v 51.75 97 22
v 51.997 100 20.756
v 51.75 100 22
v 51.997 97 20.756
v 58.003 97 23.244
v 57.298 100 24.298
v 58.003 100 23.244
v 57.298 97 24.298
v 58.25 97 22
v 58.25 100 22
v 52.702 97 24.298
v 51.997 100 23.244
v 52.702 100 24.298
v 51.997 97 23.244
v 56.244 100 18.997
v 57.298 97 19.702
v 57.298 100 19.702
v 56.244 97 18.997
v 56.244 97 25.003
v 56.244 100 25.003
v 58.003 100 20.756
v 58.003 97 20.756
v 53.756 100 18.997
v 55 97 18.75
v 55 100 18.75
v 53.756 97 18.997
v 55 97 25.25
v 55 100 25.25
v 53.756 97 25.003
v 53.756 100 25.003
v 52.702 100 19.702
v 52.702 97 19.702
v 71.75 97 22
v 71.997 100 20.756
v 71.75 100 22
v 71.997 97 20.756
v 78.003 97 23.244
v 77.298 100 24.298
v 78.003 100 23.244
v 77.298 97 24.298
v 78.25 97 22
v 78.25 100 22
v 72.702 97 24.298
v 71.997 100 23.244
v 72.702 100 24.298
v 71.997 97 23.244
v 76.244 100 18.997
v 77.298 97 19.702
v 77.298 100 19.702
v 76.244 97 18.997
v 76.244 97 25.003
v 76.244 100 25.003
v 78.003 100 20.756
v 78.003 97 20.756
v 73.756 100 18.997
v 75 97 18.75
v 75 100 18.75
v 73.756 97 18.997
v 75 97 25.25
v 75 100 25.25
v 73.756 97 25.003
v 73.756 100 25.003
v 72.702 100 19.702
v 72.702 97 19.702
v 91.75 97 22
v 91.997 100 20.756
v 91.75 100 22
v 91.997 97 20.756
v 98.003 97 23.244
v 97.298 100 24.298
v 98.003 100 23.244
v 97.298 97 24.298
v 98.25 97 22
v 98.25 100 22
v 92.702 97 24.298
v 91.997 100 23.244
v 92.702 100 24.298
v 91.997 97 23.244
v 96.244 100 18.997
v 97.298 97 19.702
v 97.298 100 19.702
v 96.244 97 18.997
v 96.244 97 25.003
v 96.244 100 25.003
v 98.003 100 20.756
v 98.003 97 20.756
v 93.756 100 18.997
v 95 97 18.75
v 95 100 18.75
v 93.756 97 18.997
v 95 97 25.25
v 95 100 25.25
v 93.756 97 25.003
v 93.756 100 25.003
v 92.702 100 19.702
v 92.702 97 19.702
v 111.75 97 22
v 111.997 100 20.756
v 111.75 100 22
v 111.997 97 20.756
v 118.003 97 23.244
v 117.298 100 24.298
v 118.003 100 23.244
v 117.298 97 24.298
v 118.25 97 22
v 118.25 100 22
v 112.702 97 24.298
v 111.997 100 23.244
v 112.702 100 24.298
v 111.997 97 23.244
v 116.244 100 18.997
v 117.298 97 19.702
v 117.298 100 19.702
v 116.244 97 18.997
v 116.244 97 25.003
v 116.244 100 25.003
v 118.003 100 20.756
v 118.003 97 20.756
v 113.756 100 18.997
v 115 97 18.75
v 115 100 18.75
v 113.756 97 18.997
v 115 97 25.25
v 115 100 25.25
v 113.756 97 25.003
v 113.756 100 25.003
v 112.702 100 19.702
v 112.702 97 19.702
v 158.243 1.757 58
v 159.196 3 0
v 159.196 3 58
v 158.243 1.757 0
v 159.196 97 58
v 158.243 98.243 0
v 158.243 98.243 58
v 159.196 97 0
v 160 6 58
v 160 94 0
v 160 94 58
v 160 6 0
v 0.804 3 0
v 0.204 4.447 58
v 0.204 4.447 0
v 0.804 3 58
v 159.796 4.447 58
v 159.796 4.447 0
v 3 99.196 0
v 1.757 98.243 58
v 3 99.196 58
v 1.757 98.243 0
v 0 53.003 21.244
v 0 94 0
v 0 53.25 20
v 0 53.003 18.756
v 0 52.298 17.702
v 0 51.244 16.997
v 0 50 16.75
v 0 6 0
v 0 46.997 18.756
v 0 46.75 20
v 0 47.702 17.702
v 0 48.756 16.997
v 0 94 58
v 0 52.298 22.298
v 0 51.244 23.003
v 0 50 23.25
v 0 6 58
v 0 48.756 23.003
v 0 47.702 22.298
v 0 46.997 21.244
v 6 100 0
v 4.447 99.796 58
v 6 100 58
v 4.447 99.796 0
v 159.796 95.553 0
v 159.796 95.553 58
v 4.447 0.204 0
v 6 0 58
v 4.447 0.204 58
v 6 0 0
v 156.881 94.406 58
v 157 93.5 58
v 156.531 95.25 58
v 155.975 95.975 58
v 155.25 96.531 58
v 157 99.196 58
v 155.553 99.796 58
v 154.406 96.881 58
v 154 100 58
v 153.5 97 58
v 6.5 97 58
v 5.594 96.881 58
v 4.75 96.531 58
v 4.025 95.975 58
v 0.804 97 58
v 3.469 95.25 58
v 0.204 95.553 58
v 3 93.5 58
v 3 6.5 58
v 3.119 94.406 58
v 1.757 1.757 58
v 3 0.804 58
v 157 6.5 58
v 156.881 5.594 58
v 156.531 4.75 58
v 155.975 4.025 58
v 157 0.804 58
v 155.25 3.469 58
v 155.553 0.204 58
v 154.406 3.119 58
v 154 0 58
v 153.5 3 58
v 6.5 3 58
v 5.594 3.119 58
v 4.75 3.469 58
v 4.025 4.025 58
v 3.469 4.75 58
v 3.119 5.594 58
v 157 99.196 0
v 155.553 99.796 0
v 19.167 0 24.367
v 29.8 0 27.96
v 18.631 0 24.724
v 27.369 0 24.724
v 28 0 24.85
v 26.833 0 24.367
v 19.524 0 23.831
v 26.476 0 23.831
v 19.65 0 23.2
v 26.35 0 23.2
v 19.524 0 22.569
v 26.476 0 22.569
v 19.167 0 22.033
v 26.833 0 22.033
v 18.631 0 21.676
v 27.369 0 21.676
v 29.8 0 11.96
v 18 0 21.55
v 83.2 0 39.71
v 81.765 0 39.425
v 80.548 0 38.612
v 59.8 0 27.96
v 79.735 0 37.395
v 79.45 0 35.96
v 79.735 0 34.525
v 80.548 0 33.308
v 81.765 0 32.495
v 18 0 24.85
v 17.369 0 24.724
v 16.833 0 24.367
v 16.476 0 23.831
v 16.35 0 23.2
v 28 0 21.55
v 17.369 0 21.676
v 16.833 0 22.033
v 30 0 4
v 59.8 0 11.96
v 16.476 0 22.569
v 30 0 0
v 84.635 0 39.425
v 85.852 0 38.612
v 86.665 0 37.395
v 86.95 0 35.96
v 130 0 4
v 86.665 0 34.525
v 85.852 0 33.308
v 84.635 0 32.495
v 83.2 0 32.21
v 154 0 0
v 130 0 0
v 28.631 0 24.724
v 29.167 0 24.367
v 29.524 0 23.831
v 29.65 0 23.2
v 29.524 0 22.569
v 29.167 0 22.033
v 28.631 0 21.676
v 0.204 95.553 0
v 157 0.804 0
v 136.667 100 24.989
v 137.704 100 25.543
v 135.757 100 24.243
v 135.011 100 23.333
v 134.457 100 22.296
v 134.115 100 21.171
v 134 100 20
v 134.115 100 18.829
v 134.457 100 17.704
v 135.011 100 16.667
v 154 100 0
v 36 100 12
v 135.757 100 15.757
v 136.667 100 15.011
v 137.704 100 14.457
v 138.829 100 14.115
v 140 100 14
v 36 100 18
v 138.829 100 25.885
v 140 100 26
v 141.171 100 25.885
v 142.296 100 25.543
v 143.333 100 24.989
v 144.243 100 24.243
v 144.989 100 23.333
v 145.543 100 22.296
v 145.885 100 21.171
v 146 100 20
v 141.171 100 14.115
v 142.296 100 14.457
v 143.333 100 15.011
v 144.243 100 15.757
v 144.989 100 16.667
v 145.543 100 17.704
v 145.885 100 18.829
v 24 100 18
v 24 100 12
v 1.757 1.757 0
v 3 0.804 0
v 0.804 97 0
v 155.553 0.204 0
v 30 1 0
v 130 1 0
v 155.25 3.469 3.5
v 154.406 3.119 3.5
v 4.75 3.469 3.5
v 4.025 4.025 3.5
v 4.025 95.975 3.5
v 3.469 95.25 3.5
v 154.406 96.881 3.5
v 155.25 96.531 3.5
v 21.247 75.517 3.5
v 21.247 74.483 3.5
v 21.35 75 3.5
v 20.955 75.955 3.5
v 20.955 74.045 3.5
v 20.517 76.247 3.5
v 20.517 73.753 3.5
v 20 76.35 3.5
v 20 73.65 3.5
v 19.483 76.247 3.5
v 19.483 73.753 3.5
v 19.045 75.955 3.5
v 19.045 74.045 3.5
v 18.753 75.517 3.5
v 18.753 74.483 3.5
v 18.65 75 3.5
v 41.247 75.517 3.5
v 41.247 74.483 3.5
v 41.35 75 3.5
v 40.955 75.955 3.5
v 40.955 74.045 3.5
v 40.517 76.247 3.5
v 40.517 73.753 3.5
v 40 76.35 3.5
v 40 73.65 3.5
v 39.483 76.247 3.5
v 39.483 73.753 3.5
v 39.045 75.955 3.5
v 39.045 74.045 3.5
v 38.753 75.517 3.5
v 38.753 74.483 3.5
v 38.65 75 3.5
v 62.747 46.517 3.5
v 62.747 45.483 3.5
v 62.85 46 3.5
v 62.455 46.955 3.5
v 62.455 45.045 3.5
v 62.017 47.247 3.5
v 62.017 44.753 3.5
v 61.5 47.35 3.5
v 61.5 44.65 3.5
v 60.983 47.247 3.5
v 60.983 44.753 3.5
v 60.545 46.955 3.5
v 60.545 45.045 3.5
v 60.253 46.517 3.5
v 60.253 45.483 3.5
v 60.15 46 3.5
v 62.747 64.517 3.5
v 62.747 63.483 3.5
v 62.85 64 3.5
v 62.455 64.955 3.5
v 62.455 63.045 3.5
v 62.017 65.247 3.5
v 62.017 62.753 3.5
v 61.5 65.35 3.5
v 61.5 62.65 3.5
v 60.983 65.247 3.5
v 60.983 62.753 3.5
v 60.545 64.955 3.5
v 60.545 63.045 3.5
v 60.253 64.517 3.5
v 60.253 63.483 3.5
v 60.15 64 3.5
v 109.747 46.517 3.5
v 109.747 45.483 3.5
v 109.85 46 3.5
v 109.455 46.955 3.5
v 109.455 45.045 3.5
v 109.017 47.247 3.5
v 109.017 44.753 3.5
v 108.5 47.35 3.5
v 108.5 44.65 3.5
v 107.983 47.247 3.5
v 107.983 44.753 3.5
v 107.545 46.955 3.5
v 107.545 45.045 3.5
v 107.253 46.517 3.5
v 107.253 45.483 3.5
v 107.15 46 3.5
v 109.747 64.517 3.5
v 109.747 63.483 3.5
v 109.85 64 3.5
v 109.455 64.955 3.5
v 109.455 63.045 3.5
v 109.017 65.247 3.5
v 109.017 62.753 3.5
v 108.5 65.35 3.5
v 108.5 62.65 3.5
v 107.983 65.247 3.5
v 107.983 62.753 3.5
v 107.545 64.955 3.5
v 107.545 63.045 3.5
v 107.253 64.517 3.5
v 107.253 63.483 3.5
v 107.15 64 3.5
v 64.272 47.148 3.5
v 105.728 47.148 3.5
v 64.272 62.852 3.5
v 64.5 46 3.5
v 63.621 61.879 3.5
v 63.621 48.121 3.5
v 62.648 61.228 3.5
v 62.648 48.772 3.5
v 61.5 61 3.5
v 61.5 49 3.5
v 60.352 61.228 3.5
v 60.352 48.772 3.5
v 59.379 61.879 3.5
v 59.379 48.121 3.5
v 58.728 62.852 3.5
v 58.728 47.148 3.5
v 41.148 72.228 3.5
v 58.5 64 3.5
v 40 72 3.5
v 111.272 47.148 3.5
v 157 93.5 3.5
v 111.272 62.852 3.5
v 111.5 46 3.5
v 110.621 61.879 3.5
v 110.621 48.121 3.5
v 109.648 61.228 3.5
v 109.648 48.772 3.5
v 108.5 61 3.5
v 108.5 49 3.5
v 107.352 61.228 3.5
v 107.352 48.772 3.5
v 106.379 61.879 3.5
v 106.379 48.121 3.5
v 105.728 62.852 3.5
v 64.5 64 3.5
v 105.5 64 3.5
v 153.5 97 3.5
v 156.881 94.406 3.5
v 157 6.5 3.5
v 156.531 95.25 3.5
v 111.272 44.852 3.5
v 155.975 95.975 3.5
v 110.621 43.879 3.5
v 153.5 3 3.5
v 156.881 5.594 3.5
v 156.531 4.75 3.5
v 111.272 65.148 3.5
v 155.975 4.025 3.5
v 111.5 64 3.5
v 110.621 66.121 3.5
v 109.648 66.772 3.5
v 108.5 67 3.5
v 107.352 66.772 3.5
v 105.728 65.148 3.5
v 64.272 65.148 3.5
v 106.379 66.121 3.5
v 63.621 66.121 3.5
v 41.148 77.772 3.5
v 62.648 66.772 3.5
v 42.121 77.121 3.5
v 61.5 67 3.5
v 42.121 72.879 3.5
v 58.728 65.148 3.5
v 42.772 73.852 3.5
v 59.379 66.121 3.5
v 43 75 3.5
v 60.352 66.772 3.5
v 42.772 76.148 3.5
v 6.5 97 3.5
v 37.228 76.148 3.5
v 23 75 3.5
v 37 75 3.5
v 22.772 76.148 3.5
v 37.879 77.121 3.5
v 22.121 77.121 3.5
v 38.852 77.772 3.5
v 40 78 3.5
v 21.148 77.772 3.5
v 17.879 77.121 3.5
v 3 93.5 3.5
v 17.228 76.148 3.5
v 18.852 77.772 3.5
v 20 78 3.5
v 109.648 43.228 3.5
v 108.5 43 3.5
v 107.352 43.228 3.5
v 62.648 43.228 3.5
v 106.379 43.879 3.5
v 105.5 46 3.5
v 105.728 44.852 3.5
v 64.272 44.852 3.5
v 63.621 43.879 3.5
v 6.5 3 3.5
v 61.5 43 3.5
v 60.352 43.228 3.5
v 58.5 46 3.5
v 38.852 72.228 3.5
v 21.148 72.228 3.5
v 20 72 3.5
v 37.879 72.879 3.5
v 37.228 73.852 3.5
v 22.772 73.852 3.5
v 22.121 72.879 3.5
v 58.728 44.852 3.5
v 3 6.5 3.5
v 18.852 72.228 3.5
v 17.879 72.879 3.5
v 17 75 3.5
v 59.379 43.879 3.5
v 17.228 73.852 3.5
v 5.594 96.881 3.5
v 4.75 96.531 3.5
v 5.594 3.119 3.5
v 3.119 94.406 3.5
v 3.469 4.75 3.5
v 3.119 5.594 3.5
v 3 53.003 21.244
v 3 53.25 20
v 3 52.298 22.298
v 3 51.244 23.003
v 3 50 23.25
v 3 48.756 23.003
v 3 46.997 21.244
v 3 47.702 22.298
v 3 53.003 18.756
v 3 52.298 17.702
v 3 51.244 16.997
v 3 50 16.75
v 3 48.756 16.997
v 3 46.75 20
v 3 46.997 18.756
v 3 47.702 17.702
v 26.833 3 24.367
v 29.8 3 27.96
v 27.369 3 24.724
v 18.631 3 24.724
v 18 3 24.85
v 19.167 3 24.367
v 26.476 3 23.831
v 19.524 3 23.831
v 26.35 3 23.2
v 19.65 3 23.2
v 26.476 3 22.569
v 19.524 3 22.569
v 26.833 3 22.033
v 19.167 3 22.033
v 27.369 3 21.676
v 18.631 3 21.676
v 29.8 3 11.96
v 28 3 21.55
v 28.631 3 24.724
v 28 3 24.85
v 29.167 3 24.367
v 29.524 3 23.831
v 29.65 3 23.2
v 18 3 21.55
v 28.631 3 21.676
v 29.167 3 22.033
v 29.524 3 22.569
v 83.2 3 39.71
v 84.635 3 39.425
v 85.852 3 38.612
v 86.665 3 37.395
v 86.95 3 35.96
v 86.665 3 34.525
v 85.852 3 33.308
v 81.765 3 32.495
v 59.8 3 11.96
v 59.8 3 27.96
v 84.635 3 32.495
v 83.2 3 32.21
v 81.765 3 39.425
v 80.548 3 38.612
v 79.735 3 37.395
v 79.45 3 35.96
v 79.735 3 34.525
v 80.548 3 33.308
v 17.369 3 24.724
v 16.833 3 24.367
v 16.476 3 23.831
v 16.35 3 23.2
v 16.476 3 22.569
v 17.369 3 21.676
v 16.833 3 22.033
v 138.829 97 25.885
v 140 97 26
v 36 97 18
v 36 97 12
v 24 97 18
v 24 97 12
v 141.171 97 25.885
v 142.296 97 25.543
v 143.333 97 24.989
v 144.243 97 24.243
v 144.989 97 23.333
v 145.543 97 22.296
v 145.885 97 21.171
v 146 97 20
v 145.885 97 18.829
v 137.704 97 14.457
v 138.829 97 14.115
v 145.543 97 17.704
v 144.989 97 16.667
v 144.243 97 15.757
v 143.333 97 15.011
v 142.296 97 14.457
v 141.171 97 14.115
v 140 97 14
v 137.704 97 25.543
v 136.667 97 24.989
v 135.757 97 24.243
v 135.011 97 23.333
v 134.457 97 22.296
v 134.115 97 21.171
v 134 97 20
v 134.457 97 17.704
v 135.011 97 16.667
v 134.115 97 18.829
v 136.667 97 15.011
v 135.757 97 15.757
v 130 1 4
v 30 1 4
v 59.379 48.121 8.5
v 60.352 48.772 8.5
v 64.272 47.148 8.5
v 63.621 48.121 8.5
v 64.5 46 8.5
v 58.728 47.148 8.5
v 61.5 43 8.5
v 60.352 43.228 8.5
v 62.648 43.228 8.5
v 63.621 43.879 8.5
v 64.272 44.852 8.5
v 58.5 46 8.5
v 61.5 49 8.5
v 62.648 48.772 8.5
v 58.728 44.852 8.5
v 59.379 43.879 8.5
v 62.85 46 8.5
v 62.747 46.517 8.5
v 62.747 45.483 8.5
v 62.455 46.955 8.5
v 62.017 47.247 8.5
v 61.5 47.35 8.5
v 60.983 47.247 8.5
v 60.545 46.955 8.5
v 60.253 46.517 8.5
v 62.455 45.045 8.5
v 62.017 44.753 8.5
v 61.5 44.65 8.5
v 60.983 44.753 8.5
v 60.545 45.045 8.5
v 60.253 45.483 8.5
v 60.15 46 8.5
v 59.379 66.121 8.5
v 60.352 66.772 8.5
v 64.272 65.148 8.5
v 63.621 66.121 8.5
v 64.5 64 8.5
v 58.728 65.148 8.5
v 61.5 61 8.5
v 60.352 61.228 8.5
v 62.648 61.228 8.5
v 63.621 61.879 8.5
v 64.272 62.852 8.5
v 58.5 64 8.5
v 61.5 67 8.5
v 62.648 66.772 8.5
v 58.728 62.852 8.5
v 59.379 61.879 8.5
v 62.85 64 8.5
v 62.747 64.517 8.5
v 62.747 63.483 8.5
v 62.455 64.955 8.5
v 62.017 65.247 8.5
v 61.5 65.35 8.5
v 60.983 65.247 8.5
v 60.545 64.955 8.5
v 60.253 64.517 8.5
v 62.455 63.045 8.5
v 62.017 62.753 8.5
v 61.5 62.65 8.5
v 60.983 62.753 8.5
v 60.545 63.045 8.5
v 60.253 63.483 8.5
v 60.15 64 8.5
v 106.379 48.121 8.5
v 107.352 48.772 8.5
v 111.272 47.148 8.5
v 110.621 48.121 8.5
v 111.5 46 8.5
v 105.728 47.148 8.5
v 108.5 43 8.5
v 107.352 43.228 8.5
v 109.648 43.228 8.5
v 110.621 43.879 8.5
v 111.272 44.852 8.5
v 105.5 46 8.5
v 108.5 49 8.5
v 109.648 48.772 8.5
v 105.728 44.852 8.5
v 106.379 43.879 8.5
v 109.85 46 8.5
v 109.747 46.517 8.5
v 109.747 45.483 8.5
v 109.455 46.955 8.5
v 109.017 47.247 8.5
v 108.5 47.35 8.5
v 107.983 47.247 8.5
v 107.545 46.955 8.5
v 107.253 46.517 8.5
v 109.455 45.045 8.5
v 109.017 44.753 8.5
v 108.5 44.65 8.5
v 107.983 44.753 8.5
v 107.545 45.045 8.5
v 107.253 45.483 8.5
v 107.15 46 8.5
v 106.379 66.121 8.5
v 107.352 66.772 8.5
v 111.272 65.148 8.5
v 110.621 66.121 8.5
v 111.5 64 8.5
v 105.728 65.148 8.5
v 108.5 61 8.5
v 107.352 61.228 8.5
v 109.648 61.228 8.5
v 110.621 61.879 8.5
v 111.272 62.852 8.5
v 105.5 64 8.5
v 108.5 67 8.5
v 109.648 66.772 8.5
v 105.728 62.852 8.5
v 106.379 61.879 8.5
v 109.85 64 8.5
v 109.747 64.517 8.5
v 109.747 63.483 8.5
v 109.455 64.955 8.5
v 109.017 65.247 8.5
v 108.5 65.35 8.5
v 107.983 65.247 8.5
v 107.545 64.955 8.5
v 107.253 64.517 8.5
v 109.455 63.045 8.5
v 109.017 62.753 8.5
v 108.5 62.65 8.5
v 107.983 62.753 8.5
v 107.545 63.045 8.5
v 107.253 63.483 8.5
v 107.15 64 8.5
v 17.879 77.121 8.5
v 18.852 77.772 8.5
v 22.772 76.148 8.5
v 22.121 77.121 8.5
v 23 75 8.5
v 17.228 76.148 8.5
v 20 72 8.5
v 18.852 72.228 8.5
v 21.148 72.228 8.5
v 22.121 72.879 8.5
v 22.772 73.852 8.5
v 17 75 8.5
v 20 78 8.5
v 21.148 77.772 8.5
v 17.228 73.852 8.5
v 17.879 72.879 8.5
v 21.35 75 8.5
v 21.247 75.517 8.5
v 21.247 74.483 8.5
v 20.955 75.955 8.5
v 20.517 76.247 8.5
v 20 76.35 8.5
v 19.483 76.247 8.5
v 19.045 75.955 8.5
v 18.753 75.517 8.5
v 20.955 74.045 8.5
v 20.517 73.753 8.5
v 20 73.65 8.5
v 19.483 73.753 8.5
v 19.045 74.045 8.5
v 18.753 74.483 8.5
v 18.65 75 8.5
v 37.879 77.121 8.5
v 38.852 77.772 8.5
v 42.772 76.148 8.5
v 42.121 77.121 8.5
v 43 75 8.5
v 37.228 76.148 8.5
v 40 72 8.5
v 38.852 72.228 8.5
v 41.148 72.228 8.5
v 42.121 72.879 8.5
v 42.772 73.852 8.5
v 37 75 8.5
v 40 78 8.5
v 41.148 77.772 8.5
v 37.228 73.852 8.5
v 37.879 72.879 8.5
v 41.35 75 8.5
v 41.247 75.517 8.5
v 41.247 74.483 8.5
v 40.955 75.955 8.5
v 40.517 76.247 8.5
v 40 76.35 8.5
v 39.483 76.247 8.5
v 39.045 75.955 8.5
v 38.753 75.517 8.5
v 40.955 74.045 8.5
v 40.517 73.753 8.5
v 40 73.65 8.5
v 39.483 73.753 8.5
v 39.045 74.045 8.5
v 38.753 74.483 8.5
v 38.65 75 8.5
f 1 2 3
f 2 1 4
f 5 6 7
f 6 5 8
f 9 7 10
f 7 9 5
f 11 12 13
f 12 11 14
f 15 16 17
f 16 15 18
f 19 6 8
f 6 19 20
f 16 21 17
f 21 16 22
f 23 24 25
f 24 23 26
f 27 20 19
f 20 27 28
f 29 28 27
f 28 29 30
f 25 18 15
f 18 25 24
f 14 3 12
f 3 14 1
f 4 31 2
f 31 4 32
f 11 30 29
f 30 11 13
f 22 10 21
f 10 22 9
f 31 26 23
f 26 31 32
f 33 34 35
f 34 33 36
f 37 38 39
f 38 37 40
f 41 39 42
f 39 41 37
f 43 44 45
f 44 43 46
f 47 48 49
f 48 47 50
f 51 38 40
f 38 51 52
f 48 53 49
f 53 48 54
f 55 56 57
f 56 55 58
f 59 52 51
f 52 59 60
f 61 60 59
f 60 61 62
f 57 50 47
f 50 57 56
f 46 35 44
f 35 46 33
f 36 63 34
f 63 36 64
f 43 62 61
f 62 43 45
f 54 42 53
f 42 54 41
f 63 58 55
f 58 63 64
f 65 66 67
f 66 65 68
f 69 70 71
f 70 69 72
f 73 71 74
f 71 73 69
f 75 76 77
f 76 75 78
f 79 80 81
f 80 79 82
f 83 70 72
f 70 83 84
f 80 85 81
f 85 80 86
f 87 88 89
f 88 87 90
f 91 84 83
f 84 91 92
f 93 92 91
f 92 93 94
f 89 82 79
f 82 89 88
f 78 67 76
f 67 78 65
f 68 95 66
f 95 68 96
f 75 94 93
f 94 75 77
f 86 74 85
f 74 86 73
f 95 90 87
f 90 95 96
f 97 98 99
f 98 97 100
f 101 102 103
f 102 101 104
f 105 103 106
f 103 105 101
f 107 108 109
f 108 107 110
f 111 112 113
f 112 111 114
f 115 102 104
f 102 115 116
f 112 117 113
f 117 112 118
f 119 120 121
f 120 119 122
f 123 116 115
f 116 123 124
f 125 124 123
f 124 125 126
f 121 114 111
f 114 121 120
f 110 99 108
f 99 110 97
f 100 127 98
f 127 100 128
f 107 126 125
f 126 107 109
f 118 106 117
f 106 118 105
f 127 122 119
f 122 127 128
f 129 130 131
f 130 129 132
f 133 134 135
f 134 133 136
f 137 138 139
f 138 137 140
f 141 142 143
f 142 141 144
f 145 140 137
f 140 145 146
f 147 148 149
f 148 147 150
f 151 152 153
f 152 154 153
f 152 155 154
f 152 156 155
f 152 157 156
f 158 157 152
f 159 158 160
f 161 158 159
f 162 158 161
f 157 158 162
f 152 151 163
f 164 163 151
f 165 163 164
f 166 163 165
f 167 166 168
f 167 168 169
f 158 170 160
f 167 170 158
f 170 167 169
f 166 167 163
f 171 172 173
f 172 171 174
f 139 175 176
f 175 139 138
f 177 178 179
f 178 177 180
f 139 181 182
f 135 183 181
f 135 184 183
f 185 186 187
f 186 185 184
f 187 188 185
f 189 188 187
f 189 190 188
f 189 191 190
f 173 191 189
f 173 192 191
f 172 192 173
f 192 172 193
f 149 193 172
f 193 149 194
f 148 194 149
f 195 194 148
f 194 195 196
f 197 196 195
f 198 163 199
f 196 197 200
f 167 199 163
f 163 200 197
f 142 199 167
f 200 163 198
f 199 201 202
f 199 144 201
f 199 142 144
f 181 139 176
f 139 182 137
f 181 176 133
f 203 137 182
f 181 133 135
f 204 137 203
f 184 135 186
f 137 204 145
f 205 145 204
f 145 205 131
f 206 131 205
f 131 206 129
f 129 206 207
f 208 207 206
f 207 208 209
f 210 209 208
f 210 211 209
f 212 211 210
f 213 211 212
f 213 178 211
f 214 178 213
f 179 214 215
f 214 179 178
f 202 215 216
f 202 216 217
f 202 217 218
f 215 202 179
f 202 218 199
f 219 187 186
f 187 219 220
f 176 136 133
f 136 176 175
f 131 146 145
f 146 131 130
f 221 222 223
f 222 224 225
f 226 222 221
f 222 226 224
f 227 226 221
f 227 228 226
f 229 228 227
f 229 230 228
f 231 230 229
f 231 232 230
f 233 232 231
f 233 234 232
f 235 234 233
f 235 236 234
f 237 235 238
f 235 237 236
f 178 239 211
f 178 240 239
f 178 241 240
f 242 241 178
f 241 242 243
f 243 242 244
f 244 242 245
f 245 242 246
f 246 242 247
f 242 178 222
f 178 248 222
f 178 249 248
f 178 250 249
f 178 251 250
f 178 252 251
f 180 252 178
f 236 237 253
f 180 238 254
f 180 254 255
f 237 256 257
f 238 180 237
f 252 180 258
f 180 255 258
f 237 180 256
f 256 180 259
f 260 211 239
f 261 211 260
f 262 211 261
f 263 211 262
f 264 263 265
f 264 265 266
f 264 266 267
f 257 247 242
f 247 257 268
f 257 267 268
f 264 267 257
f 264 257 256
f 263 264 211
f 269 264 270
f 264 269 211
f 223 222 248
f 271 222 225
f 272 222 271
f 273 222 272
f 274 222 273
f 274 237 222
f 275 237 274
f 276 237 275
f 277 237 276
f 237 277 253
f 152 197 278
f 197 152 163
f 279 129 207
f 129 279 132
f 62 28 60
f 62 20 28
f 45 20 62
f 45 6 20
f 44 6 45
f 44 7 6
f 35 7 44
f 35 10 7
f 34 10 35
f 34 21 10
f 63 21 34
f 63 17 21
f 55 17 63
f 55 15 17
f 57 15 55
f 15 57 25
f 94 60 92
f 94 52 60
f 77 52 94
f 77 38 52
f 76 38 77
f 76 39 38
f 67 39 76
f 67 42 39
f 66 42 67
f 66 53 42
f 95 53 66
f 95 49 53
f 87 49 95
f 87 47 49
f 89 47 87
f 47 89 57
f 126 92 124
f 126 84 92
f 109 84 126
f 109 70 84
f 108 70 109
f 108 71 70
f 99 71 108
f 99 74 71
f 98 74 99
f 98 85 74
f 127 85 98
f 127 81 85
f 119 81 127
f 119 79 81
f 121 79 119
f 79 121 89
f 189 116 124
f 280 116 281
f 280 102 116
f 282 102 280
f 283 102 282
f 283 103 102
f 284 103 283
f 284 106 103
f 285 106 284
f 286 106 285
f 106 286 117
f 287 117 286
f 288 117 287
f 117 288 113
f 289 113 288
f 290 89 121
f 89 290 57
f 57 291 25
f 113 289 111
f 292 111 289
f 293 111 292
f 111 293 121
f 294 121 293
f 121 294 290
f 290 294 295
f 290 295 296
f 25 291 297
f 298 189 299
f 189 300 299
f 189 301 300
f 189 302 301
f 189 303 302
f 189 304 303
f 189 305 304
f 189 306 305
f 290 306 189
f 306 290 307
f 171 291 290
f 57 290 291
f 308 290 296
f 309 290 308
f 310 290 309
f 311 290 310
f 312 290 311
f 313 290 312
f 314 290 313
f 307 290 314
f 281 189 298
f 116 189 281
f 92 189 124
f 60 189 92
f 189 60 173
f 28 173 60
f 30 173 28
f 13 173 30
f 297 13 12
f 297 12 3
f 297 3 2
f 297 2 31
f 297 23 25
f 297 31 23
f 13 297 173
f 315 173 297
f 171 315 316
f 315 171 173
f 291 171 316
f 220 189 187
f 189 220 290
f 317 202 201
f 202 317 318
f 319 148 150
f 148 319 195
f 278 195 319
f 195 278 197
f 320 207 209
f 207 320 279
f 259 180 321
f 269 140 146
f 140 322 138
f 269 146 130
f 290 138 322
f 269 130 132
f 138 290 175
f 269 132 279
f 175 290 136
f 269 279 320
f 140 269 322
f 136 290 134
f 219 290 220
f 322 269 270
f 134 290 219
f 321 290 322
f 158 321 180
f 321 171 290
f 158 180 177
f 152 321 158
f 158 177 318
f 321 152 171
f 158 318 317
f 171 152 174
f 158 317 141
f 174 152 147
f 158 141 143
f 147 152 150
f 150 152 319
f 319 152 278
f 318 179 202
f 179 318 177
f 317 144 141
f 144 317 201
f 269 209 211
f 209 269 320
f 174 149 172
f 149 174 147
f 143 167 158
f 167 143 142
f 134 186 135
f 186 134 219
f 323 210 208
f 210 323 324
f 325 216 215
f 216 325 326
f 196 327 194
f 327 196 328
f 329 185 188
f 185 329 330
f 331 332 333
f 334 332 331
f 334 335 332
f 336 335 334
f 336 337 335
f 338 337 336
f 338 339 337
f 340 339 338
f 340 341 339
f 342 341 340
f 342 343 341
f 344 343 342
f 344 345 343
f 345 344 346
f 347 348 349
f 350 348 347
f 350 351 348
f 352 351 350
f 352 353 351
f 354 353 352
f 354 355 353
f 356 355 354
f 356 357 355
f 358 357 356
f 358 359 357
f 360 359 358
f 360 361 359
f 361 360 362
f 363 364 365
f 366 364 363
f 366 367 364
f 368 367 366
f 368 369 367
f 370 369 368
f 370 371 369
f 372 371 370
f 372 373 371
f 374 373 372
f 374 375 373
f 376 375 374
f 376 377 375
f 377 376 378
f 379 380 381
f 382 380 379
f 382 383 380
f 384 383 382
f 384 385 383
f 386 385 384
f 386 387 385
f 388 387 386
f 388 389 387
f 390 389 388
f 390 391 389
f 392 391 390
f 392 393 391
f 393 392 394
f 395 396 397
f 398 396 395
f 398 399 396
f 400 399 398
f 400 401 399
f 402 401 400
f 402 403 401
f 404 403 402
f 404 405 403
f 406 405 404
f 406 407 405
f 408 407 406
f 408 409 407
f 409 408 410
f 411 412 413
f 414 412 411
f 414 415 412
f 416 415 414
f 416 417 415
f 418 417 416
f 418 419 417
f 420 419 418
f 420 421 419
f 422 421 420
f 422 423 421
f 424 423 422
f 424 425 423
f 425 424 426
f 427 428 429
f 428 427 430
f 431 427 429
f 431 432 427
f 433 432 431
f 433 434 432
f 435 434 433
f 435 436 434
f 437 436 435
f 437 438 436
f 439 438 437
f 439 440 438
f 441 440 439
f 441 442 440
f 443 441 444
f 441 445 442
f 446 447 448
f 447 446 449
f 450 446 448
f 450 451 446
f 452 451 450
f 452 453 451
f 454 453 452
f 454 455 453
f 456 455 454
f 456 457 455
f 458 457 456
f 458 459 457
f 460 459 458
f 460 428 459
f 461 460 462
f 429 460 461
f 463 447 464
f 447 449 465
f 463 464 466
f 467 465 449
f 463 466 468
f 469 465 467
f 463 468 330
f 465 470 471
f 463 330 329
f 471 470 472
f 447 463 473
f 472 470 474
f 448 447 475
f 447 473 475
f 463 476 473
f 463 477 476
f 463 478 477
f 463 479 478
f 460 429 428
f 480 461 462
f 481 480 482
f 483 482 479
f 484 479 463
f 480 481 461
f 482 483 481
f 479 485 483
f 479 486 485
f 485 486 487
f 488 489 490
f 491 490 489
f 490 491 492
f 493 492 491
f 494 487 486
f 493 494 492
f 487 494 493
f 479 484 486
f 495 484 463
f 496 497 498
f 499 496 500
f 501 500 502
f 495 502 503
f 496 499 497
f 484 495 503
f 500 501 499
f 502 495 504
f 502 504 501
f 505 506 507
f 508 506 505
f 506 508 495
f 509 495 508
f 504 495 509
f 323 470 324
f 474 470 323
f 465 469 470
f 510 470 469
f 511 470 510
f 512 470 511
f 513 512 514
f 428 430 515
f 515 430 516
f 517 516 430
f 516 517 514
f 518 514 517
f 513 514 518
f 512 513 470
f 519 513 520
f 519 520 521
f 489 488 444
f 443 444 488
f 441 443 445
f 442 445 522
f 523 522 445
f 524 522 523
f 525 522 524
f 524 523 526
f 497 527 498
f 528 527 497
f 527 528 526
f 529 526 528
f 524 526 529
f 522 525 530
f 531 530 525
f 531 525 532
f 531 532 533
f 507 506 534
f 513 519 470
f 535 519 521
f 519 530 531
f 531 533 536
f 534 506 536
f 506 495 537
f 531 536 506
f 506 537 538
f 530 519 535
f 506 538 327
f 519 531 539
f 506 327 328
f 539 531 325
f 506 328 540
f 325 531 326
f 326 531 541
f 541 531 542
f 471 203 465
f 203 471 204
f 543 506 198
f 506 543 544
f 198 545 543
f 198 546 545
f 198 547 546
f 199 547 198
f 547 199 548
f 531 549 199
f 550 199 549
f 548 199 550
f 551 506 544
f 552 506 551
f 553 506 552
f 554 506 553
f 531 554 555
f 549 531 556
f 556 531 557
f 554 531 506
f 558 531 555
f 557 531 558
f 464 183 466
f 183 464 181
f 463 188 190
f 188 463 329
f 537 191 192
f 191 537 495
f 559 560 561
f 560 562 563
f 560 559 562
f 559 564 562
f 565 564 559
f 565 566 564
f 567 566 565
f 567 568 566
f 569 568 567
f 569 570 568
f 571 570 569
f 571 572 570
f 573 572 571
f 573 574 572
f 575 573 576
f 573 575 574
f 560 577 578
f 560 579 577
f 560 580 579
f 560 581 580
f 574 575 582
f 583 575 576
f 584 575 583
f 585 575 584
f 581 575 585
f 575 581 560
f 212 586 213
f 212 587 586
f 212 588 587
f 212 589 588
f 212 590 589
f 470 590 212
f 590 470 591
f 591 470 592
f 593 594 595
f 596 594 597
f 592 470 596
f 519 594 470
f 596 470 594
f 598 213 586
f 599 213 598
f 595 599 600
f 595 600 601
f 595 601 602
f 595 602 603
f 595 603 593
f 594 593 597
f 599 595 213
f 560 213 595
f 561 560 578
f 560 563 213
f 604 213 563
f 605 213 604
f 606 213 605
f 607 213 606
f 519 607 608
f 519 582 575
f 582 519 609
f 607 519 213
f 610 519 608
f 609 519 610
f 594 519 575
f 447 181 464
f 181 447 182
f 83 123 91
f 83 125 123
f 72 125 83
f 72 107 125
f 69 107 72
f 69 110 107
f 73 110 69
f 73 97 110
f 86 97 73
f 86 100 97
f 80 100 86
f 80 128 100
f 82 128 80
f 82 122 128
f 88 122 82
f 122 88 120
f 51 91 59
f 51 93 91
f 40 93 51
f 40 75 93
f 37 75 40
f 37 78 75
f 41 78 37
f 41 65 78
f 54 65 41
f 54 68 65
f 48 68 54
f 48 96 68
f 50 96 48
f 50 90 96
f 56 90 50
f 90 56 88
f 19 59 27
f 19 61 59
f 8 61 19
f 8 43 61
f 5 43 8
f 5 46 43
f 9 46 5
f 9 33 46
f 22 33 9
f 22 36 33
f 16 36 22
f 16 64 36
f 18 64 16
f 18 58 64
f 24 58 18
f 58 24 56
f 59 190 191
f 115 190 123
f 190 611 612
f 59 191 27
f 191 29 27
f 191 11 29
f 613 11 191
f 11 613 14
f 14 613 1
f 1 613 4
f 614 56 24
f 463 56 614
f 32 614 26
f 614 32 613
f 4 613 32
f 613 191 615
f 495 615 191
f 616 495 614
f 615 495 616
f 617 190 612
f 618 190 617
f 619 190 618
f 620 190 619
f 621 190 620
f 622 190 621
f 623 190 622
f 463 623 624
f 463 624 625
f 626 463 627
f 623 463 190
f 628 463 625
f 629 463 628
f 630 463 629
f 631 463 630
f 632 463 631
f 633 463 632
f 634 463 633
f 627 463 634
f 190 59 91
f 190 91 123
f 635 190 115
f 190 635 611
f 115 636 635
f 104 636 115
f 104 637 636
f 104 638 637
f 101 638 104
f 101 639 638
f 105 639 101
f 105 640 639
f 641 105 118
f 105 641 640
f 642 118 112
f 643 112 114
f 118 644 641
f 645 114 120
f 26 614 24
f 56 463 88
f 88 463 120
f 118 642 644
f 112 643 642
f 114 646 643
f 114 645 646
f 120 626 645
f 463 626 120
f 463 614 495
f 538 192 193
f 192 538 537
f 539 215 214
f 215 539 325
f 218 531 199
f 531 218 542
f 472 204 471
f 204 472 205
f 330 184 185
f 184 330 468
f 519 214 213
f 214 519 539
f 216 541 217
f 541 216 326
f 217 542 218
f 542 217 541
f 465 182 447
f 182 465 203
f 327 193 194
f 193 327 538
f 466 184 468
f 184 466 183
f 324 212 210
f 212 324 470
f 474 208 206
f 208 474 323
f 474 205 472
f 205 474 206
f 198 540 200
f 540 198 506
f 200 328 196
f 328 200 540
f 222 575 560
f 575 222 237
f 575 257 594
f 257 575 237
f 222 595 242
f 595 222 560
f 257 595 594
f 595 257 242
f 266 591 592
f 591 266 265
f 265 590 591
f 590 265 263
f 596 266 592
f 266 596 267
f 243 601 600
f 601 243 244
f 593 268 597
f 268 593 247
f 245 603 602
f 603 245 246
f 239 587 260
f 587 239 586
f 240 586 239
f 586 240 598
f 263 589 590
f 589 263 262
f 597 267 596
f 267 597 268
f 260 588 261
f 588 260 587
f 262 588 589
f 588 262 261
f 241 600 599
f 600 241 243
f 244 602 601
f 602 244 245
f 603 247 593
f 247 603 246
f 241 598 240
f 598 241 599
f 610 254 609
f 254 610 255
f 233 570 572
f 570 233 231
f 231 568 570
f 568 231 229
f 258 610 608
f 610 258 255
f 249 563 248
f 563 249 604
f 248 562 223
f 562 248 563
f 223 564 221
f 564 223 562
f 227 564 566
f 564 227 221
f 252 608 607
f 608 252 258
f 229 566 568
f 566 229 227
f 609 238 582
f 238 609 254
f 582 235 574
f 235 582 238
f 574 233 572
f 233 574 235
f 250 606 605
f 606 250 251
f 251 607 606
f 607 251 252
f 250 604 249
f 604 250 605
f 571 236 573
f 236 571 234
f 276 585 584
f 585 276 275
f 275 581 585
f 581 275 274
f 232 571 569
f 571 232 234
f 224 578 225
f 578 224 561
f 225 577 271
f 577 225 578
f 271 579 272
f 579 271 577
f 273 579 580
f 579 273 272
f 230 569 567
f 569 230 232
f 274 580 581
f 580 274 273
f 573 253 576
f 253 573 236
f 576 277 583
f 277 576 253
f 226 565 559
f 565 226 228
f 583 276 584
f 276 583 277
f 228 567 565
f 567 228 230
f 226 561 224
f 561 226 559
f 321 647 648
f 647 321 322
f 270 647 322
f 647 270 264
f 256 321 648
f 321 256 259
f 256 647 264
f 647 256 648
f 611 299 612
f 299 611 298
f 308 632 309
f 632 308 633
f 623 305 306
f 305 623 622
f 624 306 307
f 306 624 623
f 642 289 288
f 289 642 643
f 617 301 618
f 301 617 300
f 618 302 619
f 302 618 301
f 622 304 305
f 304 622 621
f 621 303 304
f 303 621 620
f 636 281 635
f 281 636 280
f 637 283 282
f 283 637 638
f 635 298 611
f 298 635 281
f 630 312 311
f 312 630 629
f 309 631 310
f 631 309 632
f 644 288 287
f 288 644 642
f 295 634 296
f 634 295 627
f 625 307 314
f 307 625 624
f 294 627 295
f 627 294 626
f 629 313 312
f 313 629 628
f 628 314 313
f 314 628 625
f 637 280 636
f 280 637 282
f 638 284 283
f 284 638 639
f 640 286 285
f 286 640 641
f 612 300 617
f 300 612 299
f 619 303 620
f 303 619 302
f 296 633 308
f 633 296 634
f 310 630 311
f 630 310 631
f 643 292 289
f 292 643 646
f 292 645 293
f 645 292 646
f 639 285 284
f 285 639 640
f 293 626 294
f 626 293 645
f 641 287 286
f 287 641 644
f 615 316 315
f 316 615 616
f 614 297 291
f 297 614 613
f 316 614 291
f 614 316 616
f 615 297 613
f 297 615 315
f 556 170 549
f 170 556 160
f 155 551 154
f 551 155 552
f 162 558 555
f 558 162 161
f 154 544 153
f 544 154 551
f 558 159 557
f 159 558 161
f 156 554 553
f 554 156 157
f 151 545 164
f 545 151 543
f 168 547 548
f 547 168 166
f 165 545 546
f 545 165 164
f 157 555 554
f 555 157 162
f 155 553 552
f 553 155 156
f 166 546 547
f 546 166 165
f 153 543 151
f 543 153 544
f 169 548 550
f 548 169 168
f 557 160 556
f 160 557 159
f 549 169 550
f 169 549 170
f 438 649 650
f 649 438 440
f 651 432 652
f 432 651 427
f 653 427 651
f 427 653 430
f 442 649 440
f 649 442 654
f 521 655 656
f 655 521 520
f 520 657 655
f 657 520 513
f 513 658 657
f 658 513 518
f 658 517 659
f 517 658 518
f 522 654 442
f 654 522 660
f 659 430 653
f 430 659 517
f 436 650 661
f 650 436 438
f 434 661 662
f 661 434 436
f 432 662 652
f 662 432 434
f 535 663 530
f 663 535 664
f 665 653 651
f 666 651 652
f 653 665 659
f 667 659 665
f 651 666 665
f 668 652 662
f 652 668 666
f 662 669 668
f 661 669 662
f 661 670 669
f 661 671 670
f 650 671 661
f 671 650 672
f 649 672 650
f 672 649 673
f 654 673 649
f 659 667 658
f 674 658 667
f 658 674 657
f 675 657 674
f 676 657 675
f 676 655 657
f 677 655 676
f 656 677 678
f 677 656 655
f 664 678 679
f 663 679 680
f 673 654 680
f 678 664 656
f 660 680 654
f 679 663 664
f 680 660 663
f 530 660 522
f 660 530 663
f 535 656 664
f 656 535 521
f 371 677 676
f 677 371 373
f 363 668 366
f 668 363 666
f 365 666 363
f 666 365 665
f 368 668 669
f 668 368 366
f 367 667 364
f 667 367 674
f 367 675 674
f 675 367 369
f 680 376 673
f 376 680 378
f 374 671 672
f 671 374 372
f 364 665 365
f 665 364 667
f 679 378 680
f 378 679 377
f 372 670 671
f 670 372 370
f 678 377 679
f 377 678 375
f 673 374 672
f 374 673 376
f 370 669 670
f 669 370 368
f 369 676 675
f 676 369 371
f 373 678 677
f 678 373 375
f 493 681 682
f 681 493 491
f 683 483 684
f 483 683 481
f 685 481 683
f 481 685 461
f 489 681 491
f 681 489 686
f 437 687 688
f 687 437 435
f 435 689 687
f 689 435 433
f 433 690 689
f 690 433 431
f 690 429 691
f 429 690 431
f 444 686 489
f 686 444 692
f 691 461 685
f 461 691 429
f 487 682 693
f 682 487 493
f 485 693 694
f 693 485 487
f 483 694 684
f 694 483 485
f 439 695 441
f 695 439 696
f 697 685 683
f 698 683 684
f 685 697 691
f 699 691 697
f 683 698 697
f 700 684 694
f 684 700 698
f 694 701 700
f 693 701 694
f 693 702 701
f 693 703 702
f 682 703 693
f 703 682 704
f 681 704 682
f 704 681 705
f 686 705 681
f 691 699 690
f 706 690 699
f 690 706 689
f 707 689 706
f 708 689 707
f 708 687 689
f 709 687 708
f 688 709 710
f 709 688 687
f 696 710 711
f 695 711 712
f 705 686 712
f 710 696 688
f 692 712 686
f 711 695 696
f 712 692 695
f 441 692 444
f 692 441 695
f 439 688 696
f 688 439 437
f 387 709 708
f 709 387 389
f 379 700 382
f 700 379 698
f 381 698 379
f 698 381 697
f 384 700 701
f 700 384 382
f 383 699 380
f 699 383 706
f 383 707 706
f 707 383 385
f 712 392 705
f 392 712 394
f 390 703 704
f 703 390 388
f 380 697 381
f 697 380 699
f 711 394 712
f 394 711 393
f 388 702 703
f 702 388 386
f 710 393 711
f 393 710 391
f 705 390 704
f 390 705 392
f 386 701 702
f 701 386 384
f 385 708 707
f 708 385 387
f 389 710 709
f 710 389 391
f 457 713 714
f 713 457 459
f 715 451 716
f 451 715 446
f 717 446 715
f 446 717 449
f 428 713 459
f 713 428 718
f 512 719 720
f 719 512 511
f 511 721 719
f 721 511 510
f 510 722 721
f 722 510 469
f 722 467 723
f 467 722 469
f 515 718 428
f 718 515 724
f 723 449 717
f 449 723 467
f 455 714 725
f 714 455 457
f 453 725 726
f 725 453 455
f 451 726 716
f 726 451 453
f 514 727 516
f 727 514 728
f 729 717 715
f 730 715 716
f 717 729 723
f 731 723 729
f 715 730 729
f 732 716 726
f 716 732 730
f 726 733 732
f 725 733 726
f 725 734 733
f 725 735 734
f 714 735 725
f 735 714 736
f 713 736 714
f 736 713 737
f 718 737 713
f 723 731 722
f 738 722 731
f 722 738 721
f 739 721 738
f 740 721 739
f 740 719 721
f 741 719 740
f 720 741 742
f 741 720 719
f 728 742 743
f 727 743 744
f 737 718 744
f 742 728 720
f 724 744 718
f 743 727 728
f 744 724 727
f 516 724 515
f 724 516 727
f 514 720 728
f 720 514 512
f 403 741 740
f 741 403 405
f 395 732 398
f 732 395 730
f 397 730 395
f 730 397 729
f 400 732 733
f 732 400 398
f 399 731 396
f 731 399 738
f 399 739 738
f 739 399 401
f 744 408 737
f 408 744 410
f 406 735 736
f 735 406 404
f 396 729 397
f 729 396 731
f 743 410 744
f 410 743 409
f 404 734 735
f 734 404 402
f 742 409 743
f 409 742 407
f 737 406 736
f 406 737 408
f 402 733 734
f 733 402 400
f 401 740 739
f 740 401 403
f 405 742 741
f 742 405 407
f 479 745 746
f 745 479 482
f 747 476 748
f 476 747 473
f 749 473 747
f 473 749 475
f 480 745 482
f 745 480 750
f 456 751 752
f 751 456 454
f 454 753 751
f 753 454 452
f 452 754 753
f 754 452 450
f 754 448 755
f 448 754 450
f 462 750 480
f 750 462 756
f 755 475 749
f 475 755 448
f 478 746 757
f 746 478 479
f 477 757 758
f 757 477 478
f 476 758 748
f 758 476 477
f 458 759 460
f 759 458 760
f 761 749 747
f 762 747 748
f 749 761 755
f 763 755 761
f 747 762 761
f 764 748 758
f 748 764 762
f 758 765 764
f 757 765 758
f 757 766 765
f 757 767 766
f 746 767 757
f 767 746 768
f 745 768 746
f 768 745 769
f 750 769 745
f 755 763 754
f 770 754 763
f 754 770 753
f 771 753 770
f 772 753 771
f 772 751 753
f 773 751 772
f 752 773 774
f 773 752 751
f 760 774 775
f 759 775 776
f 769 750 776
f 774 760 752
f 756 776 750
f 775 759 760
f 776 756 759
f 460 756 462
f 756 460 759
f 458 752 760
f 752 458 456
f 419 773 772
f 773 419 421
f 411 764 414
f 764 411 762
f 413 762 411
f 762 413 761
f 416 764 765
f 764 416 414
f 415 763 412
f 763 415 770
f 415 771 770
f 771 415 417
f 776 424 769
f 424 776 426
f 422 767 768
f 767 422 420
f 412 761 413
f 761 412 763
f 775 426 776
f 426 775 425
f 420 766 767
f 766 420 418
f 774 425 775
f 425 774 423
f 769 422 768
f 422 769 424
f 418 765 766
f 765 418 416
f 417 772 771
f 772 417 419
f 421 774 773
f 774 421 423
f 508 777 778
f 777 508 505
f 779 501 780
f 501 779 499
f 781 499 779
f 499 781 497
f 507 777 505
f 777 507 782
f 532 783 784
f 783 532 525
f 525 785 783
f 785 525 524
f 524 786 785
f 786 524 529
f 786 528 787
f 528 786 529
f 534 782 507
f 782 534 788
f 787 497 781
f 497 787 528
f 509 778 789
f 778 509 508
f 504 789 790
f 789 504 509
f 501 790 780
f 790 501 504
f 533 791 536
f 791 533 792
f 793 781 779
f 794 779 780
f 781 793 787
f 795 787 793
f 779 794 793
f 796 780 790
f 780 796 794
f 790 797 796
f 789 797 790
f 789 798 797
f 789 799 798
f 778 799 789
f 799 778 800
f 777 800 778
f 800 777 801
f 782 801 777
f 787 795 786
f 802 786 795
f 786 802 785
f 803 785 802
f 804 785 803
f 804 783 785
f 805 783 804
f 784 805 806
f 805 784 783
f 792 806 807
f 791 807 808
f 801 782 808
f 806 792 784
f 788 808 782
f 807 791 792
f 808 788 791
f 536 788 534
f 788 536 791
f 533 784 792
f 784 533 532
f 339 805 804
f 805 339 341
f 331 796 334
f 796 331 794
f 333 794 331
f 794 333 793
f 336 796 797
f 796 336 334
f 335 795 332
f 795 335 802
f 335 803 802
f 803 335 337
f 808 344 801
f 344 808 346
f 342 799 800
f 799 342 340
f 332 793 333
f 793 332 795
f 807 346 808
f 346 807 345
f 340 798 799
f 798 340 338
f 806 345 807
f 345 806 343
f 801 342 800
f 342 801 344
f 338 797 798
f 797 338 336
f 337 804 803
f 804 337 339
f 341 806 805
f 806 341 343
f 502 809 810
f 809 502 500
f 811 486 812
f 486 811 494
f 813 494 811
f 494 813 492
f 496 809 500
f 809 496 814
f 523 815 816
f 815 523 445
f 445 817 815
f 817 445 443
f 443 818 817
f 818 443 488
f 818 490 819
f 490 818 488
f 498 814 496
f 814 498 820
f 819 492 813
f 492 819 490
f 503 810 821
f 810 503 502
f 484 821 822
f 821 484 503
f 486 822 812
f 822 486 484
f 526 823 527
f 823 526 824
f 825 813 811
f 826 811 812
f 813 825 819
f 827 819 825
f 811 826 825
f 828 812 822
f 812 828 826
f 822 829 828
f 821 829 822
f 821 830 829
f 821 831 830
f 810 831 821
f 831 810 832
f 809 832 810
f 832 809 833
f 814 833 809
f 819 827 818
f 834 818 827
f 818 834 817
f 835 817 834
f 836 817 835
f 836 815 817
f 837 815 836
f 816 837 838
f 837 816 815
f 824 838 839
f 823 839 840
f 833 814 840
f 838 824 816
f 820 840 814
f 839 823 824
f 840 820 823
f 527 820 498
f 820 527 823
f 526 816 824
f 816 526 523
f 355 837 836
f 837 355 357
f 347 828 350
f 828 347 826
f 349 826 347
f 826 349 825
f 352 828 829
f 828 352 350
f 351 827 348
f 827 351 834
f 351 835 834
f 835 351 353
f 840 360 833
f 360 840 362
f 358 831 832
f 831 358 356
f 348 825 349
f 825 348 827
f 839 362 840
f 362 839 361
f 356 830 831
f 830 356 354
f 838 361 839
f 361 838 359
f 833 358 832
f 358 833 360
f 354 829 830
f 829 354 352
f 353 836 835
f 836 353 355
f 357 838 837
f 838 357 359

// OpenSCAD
/**
 * adf_controller_box.scad — TM-ADF-ENC-001 Rev A
 * ADF System Controller Enclosure
 *
 * Houses ESP32 DevKit + SSD1306 OLED + QMC5883L + GPS module
 * Compatible with Watson-Watt HF, Doppler VHF, and Loop RDF firmware.
 *
 * Front panel: OLED window, status LED (×2), rotary encoder
 * Rear panel: DC power, USB programming, 4× BNC/SMA connectors
 * Side: GPS antenna SMA, external antenna port
 *
 * Print settings: PETG, 30% gyroid, 3 perimeters, 0.2mm
 * Envelope: body 160×100×60mm, lid 160×100×12mm (both fit 200mm cube)
 * Document: TM-ADF-ENC-001 Rev A
 */

// ─── Parameters ───────────────────────────────────────────────
box_w     = 160.0;
box_d     = 100.0;
box_h     = 58.0;
lid_h     = 12.0;
wall      = 3.0;
floor_h   = 3.5;
corner_r  = 6.0;
lid_overlap = 3.0;

// Front panel features
oled_w    = 30.0;   oled_h  = 16.0;
oled_x    = box_w * 0.28;
oled_z    = box_h * 0.62;

enc_dia   = 7.5;
enc_x     = box_w * 0.52;
enc_z     = oled_z;

pwr_led_dia = 3.3;
bt_led_dia  = 3.3;
pwr_led_x   = 18;
bt_led_x    = 28;
led_z       = box_h * 0.4;

// Rear panel
dc_jack_d = 12.0;
dc_jack_x = box_w - 20;
dc_jack_z = 20;

usb_w = 12.0;  usb_h = 6.0;
usb_x = 30;    usb_z = 15;

// RF connectors (SMA panel-mount, 6.5mm hole, M3 bolts at 11.4mm spacing)
sma_dia     = 6.5;
sma_spacing = 20.0;
sma_z       = 22;
// 4 SMA ports: for N/S/EW/SENSE or array elements
sma_x_start = 55;

// GPS antenna SMA on left side
gps_sma_z = 20;

// Lid bolts
lid_bolt_d    = 3.3;
lid_bolt_sp_x = box_w - 18;
lid_bolt_sp_y = box_d - 18;

// Standoffs for ESP32 (47×18mm bolt pattern, M2.5)
esp_x = box_w / 2 + 5;
esp_y = box_d / 2 + 5;
esp_bx = 23.5;
esp_by = 9.0;
so_h = 5.0; so_od = 6.0; so_id = 2.7;

// Standoff for GPS module (small, 20×20mm)
gps_x = 20;  gps_y = box_d - 25;

// ─── Modules ──────────────────────────────────────────────────

module rounded_box(w, d, h, r) {
    hull()
        for (x=[r, w-r]) for (y=[r, d-r])
            translate([x, y, 0]) cylinder(h=h, r=r, $fn=24);
}

module standoff(x, y, h=so_h, od=so_od, id=so_id) {
    translate([x, y, floor_h])
        difference() {
            cylinder(h=h, d=od, $fn=16);
            translate([0,0,-0.5]) cylinder(h=h+1, d=id, $fn=16);
        }
}

module sma_cutout(x, z, d=box_d) {
    translate([x, d+0.5, z])
    rotate([90,0,0])
        cylinder(h=wall+1, d=sma_dia, $fn=16);
}

module adf_body() {
    difference() {
        rounded_box(box_w, box_d, box_h, corner_r);

        // Inner cavity
        translate([wall, wall, floor_h])
            rounded_box(box_w-2*wall, box_d-2*wall, box_h, corner_r-wall+0.5);

        // ── FRONT PANEL ─────────────────────────────────────
        // OLED window
        translate([oled_x - oled_w/2, -0.5, oled_z - oled_h/2])
        rotate([-90,0,0])
            cube([oled_w, oled_h, wall+1]);

        // Encoder
        translate([enc_x, -0.5, enc_z])
        rotate([-90,0,0])
            cylinder(h=wall+1, d=enc_dia, $fn=16);

        // LEDs
        translate([pwr_led_x, -0.5, led_z])
        rotate([-90,0,0]) cylinder(h=wall+1, d=pwr_led_dia, $fn=16);
        translate([bt_led_x,  -0.5, led_z])
        rotate([-90,0,0]) cylinder(h=wall+1, d=bt_led_dia,  $fn=16);

        // Label recess
        translate([box_w/2 - 50, -0.5, 4])
        rotate([-90,0,0]) cube([100, 8, 1.5]);

        // ── REAR PANEL ──────────────────────────────────────
        // DC barrel jack
        translate([dc_jack_x, box_d+0.5, dc_jack_z])
        rotate([90,0,0]) cylinder(h=wall+1, d=dc_jack_d, $fn=32);

        // USB slot
        translate([usb_x - usb_w/2, box_d+0.5, usb_z - usb_h/2])
        rotate([90,0,0]) cube([usb_w, usb_h, wall+1]);

        // 4× SMA connectors
        for (i=[0:3])
            sma_cutout(sma_x_start + i*sma_spacing, sma_z);

        // ── LEFT SIDE PANEL ─────────────────────────────────
        // GPS antenna SMA
        translate([-0.5, box_d/2, gps_sma_z])
        rotate([0,90,0]) cylinder(h=wall+1, d=sma_dia, $fn=16);

        // ── LID BOLT HOLES ───────────────────────────────────
        for (x=[-1,1]) for (y=[-1,1])
            translate([box_w/2 + x*lid_bolt_sp_x/2,
                       box_d/2 + y*lid_bolt_sp_y/2,
                       box_h-4]) {
                cylinder(h=6, d=lid_bolt_d, $fn=16);
                cylinder(h=3, d=7, $fn=16);
            }
    }

    // PCB standoffs — ESP32
    for (xi=[-1,1]) for (yi=[-1,1])
        standoff(esp_x + xi*esp_bx, esp_y + yi*esp_by);

    // GPS module standoffs
    standoff(gps_x,       gps_y);
    standoff(gps_x + 20,  gps_y);
}

module adf_lid() {
    difference() {
        union() {
            rounded_box(box_w, box_d, lid_h - lid_overlap, corner_r);
            translate([0, 0, lid_h - lid_overlap])
                rounded_box(box_w-2*wall-0.4, box_d-2*wall-0.4, lid_overlap, corner_r-wall);
        }
        // Bolt holes
        for (x=[-1,1]) for (y=[-1,1])
            translate([box_w/2 + x*lid_bolt_sp_x/2,
                       box_d/2 + y*lid_bolt_sp_y/2, -0.5])
                cylinder(h=lid_h+1, d=lid_bolt_d, $fn=16);
        // Vent slots (3×)
        for (x=[50, 80, 110])
            translate([x, box_d*0.25, -0.5])
                cube([6, box_d*0.5, lid_h+1]);
    }
}

// ─── Render ───────────────────────────────────────────────────
$fn = 48;
print_part = "body";  // "body" | "lid" | "all"

if (print_part == "body") {
    color("darkgray") adf_body();
} else if (print_part == "lid") {
    color("gray")
    translate([0, 0, box_h + 10]) adf_lid();
} else {
    color("darkgray", 0.85) adf_body();
    color("gray", 0.5)
    translate([0, 0, box_h + 5]) adf_lid();
}

// ─── Notes ────────────────────────────────────────────────────
// FRONT PANEL (L to R): [PWR LED][BT LED] [OLED 30×16mm] [ENCODER]
// REAR PANEL (L to R): [USB] [SMA×4: E1/E2/E3/SENSE] [DC 12V]
// LEFT SIDE: [GPS SMA]
// ASSEMBLY:
//   1. M3 heat-set inserts in all standoffs
//   2. Mount ESP32 on standoffs with M2.5×6
//   3. Mount GPS module on GPS standoffs with M2.5×6
//   4. Press OLED into front panel window, hot-glue to secure
//   5. Install encoder and LEDs through front panel
//   6. SMA connectors thread through rear holes and nut from inside
//   7. Close lid, 4× M3×8 screws
